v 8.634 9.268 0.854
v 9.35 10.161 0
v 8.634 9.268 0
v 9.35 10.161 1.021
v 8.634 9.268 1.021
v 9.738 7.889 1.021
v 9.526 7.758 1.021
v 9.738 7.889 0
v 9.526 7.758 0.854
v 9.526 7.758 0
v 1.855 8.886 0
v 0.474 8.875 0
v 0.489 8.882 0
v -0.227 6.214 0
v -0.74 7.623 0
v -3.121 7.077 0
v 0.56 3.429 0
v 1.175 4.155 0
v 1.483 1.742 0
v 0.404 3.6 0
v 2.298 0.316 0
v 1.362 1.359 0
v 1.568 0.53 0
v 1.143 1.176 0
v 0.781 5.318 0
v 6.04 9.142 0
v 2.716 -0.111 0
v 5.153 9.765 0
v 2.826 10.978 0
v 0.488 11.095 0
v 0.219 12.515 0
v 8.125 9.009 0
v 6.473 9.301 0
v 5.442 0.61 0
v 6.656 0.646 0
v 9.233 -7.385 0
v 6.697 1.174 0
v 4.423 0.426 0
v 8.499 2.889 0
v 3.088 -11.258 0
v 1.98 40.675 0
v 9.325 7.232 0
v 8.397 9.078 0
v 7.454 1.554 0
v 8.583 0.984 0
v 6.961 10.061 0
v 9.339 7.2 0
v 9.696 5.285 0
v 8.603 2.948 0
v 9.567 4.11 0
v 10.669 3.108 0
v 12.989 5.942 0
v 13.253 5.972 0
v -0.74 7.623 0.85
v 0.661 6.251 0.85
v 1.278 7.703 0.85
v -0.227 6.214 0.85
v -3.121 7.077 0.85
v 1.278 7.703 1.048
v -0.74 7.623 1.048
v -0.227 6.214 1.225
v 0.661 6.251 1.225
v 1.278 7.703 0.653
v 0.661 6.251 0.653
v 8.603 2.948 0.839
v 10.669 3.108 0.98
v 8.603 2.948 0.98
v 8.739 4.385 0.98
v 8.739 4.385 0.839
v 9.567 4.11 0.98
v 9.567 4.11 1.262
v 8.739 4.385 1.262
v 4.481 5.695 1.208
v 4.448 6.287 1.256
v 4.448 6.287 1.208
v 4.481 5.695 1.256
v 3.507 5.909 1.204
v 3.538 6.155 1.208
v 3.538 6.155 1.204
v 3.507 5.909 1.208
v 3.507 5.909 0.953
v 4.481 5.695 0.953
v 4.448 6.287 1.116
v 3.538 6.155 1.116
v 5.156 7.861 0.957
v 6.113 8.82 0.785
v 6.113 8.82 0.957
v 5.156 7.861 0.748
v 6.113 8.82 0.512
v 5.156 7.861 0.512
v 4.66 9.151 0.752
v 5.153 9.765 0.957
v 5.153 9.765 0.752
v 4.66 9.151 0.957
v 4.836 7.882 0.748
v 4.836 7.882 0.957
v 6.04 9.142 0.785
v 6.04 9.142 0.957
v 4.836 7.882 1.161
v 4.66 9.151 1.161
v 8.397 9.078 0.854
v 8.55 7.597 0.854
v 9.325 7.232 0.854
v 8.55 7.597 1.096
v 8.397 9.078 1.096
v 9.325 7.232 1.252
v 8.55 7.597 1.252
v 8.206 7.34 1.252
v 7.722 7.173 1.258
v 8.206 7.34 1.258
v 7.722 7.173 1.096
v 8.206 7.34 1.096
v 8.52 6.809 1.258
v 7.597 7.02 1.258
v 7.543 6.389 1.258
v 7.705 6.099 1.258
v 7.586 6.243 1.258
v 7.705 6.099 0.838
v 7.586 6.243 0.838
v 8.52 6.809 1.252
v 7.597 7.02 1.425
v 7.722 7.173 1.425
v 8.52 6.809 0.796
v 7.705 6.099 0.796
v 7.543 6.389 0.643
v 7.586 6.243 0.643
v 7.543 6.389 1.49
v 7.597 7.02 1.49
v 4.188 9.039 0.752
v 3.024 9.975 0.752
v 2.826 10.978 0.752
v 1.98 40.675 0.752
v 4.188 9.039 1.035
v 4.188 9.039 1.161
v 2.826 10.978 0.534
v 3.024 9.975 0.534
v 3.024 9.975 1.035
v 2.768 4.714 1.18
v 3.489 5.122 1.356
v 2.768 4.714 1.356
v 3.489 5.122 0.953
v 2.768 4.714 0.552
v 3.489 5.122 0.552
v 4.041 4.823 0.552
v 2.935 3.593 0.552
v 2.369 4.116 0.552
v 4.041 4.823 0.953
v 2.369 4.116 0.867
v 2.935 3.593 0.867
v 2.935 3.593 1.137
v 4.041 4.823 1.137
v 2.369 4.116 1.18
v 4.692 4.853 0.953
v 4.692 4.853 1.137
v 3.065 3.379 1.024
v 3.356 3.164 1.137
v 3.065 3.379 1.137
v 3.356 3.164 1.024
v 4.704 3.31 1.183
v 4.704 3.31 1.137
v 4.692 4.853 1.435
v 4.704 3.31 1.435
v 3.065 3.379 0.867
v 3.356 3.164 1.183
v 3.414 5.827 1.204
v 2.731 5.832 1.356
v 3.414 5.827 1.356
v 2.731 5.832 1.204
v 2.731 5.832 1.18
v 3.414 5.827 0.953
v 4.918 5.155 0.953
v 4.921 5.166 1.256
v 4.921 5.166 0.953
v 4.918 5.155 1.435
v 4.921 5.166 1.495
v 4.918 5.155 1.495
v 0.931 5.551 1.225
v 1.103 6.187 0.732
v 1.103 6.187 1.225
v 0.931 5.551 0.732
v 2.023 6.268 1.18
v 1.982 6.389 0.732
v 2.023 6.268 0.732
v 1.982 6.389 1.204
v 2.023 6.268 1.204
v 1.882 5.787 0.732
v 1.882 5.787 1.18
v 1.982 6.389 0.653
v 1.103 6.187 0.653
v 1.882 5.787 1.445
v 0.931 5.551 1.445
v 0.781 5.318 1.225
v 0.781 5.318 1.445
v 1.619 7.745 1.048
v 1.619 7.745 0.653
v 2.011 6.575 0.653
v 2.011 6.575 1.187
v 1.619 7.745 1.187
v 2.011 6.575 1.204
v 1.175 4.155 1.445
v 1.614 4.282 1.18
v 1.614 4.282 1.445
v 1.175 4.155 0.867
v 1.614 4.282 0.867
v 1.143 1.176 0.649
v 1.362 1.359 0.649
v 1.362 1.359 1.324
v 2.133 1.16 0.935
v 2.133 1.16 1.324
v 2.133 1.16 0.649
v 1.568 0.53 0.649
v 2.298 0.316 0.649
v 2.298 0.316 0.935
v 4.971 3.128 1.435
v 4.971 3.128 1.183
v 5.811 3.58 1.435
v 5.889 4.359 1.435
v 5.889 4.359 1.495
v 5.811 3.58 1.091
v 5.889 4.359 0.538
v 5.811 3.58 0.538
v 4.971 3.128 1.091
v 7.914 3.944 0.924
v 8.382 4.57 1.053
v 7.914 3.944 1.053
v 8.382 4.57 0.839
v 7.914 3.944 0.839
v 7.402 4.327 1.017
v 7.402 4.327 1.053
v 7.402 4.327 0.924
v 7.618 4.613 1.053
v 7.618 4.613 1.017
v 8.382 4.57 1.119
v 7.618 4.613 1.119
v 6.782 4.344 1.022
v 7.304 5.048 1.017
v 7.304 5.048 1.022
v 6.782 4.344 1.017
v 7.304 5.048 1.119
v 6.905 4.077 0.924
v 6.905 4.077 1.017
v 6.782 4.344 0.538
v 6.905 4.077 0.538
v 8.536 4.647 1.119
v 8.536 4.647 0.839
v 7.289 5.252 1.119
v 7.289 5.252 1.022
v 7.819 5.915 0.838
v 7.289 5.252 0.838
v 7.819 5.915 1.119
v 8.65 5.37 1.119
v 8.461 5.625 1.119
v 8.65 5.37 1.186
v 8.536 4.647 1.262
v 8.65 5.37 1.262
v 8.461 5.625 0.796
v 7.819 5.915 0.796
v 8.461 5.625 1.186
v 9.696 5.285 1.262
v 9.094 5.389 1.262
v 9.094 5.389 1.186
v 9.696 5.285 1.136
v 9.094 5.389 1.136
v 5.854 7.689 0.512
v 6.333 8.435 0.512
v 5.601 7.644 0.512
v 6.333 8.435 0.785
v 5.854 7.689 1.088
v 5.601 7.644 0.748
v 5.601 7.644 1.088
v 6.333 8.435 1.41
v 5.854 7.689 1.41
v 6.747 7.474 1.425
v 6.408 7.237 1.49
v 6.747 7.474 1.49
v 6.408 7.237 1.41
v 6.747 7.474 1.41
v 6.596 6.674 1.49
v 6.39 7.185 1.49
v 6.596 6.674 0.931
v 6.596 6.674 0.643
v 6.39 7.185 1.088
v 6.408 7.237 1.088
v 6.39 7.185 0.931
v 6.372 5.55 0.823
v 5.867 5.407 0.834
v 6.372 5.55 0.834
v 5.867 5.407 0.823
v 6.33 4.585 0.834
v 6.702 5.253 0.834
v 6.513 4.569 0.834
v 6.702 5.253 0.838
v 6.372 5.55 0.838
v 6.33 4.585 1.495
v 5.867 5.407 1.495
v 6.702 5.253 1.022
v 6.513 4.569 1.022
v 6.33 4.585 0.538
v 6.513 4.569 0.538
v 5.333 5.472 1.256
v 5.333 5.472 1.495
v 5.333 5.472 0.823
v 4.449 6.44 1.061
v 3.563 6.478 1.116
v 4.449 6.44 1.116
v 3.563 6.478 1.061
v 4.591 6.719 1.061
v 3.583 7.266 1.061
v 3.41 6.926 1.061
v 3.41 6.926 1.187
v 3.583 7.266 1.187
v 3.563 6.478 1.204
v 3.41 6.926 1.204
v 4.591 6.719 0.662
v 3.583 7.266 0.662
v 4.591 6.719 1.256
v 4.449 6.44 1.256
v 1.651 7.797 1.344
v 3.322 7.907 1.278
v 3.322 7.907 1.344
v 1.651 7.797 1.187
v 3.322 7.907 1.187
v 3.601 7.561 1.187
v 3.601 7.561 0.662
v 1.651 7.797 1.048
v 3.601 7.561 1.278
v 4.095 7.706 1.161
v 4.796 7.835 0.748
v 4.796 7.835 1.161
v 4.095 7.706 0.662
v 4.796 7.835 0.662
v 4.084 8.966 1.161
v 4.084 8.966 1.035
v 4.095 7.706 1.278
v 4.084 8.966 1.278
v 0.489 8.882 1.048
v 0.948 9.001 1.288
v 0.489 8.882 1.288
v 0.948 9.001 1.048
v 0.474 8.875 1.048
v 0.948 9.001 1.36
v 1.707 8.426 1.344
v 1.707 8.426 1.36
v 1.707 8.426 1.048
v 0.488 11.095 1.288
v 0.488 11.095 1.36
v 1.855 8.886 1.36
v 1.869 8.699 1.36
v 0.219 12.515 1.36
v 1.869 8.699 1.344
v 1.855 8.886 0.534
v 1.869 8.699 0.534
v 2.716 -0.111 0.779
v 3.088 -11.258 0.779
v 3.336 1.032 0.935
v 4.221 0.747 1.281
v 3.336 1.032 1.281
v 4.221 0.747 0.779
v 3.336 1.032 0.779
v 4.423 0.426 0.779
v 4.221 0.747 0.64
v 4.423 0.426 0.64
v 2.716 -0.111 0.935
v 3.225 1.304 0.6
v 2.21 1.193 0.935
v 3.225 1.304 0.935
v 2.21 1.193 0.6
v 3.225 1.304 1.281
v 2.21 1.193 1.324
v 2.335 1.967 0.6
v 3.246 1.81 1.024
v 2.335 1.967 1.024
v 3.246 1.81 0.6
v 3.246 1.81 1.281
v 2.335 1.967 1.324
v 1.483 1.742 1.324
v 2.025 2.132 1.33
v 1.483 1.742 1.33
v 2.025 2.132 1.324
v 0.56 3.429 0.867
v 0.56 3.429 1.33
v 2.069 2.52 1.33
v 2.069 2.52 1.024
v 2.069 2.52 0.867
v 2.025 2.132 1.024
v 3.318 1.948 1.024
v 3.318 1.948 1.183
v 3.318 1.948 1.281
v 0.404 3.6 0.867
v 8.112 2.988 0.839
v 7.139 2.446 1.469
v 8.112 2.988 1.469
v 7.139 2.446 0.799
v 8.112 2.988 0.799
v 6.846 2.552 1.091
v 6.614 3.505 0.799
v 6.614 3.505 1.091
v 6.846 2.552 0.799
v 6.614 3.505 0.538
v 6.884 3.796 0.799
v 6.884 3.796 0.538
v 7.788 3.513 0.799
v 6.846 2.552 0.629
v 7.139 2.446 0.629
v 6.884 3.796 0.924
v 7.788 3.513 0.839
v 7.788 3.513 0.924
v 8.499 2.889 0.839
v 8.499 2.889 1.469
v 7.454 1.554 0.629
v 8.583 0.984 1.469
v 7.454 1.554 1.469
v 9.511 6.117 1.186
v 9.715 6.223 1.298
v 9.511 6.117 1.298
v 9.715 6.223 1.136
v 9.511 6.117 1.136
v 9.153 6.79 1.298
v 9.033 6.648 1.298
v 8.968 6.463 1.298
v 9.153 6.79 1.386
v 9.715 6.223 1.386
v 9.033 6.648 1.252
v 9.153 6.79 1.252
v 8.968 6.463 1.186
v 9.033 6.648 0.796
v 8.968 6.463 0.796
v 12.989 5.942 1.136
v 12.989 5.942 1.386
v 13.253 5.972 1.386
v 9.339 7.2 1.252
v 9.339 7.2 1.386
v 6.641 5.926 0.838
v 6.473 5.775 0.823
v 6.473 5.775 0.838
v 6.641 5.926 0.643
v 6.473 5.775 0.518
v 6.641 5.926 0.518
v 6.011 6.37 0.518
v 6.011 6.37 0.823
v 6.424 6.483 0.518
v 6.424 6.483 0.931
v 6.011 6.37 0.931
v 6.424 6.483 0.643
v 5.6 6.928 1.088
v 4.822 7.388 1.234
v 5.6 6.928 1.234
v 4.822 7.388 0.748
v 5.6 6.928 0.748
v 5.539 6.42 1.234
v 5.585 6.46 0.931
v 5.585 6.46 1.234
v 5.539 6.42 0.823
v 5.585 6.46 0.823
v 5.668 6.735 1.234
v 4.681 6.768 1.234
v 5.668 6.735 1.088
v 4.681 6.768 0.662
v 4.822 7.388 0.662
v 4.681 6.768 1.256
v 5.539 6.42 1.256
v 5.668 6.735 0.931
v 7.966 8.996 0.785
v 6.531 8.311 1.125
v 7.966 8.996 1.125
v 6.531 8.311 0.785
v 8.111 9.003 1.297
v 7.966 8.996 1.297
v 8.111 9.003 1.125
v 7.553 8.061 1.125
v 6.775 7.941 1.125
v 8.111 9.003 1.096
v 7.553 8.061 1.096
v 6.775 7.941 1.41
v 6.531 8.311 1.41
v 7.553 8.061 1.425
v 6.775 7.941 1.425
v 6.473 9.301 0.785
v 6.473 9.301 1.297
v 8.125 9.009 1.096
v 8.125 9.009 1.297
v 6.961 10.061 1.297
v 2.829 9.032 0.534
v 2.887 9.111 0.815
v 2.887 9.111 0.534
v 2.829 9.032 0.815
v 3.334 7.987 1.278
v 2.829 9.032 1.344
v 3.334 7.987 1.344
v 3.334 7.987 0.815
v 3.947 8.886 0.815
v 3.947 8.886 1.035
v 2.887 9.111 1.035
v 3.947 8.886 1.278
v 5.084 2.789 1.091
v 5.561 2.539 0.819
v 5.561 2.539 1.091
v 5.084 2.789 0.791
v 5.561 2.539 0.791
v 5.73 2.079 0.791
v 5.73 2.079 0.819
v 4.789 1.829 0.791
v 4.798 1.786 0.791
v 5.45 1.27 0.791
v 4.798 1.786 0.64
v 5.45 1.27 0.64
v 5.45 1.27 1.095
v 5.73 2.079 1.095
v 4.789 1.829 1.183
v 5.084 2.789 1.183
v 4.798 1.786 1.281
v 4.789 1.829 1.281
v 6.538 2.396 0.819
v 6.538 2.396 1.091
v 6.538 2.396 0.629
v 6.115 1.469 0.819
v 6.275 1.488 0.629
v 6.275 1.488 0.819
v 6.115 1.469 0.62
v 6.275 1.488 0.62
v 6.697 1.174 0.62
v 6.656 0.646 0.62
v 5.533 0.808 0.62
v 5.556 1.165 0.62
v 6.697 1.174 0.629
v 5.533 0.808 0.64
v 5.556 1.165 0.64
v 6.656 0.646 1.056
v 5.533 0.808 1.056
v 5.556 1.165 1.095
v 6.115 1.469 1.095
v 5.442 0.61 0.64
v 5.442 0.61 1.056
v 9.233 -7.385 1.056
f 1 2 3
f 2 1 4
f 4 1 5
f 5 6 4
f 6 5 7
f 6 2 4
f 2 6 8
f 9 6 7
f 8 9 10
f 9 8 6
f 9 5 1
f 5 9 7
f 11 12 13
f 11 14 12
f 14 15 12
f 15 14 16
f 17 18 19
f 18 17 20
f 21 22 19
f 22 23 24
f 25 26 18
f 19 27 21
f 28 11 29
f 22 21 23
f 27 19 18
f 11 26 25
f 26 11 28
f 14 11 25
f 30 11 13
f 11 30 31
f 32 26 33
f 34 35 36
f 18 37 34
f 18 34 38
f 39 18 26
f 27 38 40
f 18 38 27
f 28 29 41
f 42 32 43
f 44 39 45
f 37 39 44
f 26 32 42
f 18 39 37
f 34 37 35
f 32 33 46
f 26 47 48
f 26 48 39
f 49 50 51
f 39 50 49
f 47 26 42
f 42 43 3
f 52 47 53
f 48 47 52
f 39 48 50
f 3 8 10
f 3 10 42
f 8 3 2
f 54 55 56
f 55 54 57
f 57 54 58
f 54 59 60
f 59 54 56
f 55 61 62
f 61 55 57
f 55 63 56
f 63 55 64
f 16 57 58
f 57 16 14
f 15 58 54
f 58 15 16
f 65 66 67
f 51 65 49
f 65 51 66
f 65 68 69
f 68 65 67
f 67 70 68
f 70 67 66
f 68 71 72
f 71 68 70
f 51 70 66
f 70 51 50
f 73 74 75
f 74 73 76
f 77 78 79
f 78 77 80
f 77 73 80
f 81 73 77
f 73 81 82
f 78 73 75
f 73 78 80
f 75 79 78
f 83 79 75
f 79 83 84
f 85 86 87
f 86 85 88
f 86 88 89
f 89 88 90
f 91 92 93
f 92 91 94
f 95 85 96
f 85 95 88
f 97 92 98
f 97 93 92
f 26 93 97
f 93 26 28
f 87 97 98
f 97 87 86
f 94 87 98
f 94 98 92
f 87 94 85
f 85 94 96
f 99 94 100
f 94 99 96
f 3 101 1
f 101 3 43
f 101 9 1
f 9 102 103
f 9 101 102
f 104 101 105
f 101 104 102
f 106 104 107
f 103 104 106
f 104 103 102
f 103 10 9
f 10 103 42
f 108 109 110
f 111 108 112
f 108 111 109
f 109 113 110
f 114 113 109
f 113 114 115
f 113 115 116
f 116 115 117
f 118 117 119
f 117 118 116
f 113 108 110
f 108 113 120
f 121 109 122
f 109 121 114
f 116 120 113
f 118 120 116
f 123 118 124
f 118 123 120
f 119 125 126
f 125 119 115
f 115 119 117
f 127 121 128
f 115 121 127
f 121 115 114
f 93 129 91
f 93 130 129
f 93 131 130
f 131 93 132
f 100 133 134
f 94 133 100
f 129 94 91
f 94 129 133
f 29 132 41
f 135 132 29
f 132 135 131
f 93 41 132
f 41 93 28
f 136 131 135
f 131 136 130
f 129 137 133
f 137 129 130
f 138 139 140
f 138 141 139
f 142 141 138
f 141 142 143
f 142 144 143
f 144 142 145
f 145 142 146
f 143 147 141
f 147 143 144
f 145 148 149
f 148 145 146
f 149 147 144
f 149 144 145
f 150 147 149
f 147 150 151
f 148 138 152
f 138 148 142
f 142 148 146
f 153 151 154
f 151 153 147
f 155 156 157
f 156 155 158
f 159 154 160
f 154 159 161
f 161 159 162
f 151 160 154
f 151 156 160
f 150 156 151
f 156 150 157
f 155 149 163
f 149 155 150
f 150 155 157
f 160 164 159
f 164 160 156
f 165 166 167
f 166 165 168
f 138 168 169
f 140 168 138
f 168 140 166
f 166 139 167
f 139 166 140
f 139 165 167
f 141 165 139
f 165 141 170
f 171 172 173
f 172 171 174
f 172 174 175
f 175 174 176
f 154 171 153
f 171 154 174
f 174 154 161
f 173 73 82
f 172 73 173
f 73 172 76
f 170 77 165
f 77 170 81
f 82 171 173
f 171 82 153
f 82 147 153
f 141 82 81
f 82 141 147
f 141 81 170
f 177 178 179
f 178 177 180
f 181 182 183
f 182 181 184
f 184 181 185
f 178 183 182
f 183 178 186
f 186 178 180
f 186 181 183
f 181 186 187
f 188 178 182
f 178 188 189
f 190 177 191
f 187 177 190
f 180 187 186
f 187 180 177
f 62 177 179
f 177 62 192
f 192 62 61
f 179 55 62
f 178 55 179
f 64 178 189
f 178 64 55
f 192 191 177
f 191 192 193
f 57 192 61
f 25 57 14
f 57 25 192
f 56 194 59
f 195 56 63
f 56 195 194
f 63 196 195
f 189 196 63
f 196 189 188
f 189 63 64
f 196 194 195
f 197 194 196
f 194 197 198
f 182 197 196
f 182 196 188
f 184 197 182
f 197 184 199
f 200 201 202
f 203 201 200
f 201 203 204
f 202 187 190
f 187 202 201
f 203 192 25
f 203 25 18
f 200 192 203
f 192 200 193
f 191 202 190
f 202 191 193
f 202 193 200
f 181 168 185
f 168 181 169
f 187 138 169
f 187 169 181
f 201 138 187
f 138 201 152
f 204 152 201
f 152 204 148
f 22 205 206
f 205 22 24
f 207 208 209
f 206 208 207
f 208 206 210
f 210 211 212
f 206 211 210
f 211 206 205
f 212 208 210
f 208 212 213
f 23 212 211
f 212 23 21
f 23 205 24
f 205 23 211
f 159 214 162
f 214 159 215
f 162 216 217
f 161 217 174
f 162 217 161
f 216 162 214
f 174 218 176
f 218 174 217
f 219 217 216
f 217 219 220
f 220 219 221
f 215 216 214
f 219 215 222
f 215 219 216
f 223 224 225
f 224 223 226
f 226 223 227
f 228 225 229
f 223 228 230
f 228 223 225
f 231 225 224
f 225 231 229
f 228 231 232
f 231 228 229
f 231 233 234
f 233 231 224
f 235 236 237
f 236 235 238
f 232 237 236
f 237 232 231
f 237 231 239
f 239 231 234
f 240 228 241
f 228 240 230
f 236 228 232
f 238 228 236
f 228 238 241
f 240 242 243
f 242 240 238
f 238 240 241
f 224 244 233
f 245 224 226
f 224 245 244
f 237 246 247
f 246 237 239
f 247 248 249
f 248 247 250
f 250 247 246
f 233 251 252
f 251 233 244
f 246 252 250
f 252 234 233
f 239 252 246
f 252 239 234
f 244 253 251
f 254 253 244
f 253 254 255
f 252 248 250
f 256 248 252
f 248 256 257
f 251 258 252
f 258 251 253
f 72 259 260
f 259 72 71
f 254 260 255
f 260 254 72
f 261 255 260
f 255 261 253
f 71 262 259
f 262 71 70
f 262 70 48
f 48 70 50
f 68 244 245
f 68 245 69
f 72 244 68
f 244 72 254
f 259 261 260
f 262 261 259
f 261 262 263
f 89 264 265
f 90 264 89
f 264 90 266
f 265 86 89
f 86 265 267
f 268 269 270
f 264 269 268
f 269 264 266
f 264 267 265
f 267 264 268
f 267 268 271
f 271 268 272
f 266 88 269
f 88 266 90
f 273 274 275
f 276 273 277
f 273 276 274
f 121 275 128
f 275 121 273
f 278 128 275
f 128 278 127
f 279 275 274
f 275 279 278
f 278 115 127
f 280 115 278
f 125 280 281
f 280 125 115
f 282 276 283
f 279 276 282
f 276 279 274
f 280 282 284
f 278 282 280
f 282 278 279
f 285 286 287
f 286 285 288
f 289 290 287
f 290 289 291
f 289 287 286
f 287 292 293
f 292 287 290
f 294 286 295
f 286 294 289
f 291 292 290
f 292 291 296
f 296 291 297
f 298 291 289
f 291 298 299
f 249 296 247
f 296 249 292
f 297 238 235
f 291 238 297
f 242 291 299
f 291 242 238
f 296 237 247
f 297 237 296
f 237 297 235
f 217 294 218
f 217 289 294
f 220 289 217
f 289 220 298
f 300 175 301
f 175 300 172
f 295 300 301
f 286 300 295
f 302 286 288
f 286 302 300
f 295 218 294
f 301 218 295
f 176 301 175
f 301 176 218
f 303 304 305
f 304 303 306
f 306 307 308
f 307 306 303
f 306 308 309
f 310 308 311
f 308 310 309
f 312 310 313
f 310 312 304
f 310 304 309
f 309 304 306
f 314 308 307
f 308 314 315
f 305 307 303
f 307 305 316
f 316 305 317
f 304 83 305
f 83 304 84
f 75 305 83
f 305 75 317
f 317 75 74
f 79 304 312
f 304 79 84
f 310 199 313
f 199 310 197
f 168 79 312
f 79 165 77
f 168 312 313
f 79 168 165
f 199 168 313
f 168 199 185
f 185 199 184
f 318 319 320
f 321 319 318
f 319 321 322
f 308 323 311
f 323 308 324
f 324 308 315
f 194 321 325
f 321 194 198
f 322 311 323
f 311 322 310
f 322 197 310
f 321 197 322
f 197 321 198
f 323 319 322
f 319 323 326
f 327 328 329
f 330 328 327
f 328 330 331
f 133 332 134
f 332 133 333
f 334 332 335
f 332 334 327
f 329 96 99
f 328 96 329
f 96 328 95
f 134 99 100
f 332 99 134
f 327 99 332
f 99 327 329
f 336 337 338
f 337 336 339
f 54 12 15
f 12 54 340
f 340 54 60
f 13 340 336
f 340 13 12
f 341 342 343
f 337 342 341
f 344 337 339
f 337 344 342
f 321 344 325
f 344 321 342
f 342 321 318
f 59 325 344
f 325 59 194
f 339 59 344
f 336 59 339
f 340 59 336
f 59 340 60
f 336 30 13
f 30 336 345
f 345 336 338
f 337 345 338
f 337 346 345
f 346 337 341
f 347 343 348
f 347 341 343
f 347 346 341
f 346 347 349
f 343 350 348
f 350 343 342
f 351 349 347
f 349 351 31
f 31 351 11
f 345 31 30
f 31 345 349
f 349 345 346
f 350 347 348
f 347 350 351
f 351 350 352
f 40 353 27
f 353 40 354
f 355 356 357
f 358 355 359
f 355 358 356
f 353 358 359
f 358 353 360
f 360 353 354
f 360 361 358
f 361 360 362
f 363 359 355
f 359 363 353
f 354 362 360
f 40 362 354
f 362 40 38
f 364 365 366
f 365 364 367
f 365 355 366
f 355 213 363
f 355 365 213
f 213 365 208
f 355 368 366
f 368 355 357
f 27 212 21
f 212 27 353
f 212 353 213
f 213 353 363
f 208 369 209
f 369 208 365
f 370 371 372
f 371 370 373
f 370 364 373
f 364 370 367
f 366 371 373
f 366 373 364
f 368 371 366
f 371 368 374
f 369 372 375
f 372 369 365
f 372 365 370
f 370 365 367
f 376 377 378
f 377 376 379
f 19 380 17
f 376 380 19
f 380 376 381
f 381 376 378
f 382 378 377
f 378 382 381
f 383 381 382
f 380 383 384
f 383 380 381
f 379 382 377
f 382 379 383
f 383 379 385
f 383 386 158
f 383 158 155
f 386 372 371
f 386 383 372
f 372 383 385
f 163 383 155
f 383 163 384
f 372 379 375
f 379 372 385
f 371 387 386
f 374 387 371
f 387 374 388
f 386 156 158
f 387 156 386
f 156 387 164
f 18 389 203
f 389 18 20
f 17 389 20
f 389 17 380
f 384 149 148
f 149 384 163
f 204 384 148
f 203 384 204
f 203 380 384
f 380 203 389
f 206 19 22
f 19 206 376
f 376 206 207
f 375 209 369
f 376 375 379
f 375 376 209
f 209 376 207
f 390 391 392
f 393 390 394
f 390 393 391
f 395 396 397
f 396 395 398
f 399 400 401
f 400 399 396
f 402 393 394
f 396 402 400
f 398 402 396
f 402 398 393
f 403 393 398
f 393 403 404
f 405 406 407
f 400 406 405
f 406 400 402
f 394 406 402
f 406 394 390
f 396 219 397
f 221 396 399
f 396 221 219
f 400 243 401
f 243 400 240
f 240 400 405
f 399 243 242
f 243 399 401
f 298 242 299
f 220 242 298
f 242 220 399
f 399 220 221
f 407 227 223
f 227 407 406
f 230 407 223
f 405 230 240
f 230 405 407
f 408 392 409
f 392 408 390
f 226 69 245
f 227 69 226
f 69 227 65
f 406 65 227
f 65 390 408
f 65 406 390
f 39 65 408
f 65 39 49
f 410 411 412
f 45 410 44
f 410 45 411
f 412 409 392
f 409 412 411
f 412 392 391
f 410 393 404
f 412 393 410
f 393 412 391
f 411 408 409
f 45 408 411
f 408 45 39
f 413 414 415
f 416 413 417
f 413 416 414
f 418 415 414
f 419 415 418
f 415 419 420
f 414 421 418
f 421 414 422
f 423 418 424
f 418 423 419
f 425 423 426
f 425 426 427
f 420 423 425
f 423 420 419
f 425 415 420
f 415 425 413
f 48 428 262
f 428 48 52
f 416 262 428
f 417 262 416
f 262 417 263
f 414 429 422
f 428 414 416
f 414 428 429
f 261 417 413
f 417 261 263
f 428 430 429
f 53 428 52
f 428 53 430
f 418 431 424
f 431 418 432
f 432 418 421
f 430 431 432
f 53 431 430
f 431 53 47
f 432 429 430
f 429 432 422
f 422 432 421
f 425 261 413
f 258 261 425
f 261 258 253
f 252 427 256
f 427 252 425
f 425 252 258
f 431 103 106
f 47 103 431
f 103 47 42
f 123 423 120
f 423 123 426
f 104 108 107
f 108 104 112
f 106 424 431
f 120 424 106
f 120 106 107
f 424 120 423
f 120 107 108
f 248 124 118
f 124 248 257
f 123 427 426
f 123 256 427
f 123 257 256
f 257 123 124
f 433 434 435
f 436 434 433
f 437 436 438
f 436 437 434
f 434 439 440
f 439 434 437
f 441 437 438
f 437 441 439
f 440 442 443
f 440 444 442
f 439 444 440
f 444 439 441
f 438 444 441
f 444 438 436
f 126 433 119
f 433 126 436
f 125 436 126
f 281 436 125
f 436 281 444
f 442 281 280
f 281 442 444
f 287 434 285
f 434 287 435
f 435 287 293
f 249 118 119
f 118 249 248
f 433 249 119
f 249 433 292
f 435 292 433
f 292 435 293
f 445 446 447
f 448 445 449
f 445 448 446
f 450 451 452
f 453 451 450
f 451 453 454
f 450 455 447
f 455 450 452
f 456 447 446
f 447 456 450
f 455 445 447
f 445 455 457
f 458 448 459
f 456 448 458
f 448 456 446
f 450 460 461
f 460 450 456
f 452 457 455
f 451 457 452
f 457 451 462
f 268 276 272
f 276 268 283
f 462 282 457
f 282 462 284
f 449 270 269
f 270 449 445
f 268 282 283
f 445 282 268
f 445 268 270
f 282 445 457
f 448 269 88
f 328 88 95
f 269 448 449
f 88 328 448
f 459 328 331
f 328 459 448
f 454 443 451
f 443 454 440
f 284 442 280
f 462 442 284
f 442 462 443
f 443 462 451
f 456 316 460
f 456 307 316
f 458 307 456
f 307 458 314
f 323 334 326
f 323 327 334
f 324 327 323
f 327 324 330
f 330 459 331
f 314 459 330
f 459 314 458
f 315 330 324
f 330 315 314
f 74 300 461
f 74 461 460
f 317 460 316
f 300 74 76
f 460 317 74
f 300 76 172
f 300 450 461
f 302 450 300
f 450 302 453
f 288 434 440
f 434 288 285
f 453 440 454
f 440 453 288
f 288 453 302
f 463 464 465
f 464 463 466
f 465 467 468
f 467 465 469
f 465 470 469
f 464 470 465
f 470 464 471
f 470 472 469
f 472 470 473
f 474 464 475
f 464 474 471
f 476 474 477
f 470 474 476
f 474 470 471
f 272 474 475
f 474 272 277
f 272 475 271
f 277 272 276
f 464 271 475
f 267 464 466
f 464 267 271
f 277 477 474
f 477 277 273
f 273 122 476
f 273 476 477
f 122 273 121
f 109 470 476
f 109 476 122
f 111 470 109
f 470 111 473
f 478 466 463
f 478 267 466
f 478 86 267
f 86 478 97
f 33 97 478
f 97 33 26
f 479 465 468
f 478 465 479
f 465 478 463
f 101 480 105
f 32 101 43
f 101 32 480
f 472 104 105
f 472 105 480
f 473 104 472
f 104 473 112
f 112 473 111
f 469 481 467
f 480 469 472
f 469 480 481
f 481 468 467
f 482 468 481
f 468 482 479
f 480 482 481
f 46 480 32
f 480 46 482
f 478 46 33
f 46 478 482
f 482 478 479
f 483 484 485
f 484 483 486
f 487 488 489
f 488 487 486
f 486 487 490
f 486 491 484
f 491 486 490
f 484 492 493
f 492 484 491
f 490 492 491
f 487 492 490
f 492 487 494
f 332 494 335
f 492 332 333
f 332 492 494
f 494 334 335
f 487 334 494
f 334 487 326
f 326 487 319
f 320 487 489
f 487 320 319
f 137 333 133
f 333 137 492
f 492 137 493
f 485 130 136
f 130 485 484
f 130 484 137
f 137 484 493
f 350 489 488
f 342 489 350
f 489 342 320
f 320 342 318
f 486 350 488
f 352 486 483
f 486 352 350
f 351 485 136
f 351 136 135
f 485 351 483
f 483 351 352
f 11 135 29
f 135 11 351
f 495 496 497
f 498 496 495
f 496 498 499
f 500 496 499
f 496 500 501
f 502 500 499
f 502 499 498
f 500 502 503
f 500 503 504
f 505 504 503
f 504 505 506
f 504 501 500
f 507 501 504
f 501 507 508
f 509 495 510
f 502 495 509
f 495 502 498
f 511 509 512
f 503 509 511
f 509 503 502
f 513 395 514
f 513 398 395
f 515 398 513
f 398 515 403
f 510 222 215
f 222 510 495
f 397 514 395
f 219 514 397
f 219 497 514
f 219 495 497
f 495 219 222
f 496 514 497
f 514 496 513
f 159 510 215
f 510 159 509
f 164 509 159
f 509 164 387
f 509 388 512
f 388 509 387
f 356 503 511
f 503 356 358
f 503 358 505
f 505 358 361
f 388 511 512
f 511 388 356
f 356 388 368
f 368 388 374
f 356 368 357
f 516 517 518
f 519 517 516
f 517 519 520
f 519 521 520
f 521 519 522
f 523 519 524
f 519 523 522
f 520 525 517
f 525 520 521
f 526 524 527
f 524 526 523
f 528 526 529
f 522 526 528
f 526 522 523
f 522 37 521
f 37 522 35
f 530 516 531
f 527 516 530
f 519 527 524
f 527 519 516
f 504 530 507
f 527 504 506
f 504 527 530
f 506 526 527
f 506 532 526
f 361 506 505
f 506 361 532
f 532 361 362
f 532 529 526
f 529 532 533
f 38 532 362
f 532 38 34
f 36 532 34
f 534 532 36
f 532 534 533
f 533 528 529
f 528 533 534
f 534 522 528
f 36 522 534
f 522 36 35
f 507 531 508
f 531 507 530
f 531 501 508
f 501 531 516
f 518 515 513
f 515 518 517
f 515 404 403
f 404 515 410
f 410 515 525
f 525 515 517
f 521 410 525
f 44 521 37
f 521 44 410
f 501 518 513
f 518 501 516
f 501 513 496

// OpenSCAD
union() {
	linear_extrude(height = 1.0207922870) {
		polygon(paths = [[0, 1, 2, 3]], points = [[9.52566656256, 7.75836617469], [8.63392170772, 9.26786135332], [9.35002865057, 10.1605692325], [9.73784765292, 7.88861155978]]);
	}
	linear_extrude(height = 0.8497586225) {
		polygon(paths = [[0, 1, 2, 3, 4]], points = [[1.27799073559, 7.70348204245], [0.661408463257, 6.25144660433], [-0.226826437742, 6.21355144658], [-3.12149477588, 7.0767058796], [-0.739716736418, 7.62337323549]]);
	}
	linear_extrude(height = 0.9801351133) {
		polygon(paths = [[0, 1, 2, 3]], points = [[8.73892172541, 4.38512109028], [9.5674535006, 4.10991169649], [10.6688512756, 3.10831665664], [8.60269110292, 2.94796179979]]);
	}
	linear_extrude(height = 1.2083709732) {
		polygon(paths = [[0, 1, 2, 3]], points = [[3.53832100087, 6.15539449564], [4.44846604423, 6.28672187119], [4.48127992633, 5.6946344687], [3.50712951526, 5.90906334299]]);
	}
	linear_extrude(height = 0.9573823767) {
		polygon(paths = [[0, 1, 2, 3, 4, 5]], points = [[6.11284510928, 8.81979017659], [6.0397108407, 9.14182763606], [5.15340882167, 9.76510572152], [4.66045454331, 9.15068245735], [4.83611394999, 7.88154454414], [5.15613683869, 7.86124328209]]);
	}
	linear_extrude(height = 0.8544519060) {
		polygon(paths = [[0, 1, 2, 3, 4]], points = [[9.3250596394, 7.23165176768], [9.52566656256, 7.75836617469], [8.63392170772, 9.26786135332], [8.3966686199, 9.07778569864], [8.55047109513, 7.59704590106]]);
	}
	linear_extrude(height = 1.2580519610) {
		polygon(paths = [[0, 1, 2, 3, 4, 5, 6]], points = [[7.58597784175, 6.24304880706], [7.54262375542, 6.38888645463], [7.5974129095, 7.01984199858], [7.72203919516, 7.17336323244], [8.20596704088, 7.33985616165], [8.51985390331, 6.80928840613], [7.70525980416, 6.09871126163]]);
	}
	linear_extrude(height = 0.7522731902) {
		polygon(paths = [[0, 1, 2, 3, 4, 5]], points = [[4.18844691984, 9.03859152], [4.66045454331, 9.15068245735], [5.15340882167, 9.76510572152], [1.97962206675, 40.6749598419], [2.82552954604, 10.9781721163], [3.02394524632, 9.97536280468]]);
	}
	linear_extrude(height = 0.5522795534) {
		polygon(paths = [[0, 1, 2, 3, 4]], points = [[4.04123916644, 4.82265946782], [2.93510144866, 3.59261703475], [2.36936049365, 4.11573184318], [2.76796677381, 4.71373396677], [3.48858280028, 5.12167315215]]);
	}
	linear_extrude(height = 1.1374388929) {
		polygon(paths = [[0, 1, 2, 3, 4, 5]], points = [[4.04123916644, 4.82265946782], [4.69244746141, 4.85278409801], [4.70351558892, 3.30980985899], [3.3563735058, 3.16428860819], [3.06509011333, 3.37886682872], [2.93510144866, 3.59261703475]]);
	}
	linear_extrude(height = 1.3559055023) {
		polygon(paths = [[0, 1, 2, 3]], points = [[3.48858280028, 5.12167315215], [3.41424595672, 5.826690721], [2.73068445473, 5.83239785703], [2.76796677381, 4.71373396677]]);
	}
	linear_extrude(height = 0.9528584085) {
		polygon(paths = [[0, 1, 2, 3, 4, 5, 6, 7]], points = [[4.04123916644, 4.82265946782], [4.69244746141, 4.85278409801], [4.91755376756, 5.1545550275], [4.92111601951, 5.16639881272], [4.48127992633, 5.6946344687], [3.50712951526, 5.90906334299], [3.41424595672, 5.826690721], [3.48858280028, 5.12167315215]]);
	}
	linear_extrude(height = 0.7315363178) {
		polygon(paths = [[0, 1, 2, 3, 4]], points = [[1.88153125016, 5.78700187361], [0.930702142117, 5.55105298225], [1.10299619594, 6.18748822931], [1.98229237417, 6.38945899755], [2.02265560746, 6.26847966471]]);
	}
	linear_extrude(height = 1.2249668668) {
		polygon(paths = [[0, 1, 2, 3, 4]], points = [[0.930702142117, 5.55105298225], [0.780654764482, 5.31809381197], [-0.226826437742, 6.21355144658], [0.661408463257, 6.25144660433], [1.10299619594, 6.18748822931]]);
	}
	linear_extrude(height = 0.6527106851) {
		polygon(paths = [[0, 1, 2, 3, 4, 5]], points = [[1.98229237417, 6.38945899755], [2.01121521685, 6.57463932967], [1.61899356431, 7.74538067286], [1.27799073559, 7.70348204245], [0.661408463257, 6.25144660433], [1.10299619594, 6.18748822931]]);
	}
	linear_extrude(height = 1.4453527562) {
		polygon(paths = [[0, 1, 2, 3, 4]], points = [[1.88153125016, 5.78700187361], [1.61440509874, 4.28228572455], [1.17502969525, 4.15476345653], [0.780654764482, 5.31809381197], [0.930702142117, 5.55105298225]]);
	}
	linear_extrude(height = 1.1802515304) {
		polygon(paths = [[0, 1, 2, 3, 4, 5]], points = [[1.88153125016, 5.78700187361], [1.61440509874, 4.28228572455], [2.36936049365, 4.11573184318], [2.76796677381, 4.71373396677], [2.73068445473, 5.83239785703], [2.02265560746, 6.26847966471]]);
	}
	linear_extrude(height = 0.6488736969) {
		polygon(paths = [[0, 1, 2, 3, 4]], points = [[1.36242036164, 1.3594317419], [1.14280830335, 1.17582469596], [1.56826054723, 0.530047623123], [2.29843176366, 0.316159234238], [2.13256252282, 1.15996950513]]);
	}
	linear_extrude(height = 1.4350478301) {
		polygon(paths = [[0, 1, 2, 3, 4, 5]], points = [[5.81148807237, 3.58000651584], [5.88860488395, 4.35931171311], [4.91755376756, 5.1545550275], [4.69244746141, 4.85278409801], [4.70351558892, 3.30980985899], [4.97075097424, 3.12796967344]]);
	}
	linear_extrude(height = 1.0528887361) {
		polygon(paths = [[0, 1, 2, 3]], points = [[7.401858997, 4.32654180336], [7.91428217002, 3.94381461918], [8.38211772214, 4.57027723182], [7.61762758241, 4.61288197636]]);
	}
	linear_extrude(height = 1.0169959326) {
		polygon(paths = [[0, 1, 2, 3, 4]], points = [[7.401858997, 4.32654180336], [6.90469286349, 4.07746142729], [6.78210369509, 4.34442336312], [7.30402620225, 5.04798863753], [7.61762758241, 4.61288197636]]);
	}
	linear_extrude(height = 1.1187382762) {
		polygon(paths = [[0, 1, 2, 3, 4, 5, 6, 7]], points = [[8.6502901473, 5.36997964674], [8.53636489392, 4.6465476257], [8.38211772214, 4.57027723182], [7.61762758241, 4.61288197636], [7.30402620225, 5.04798863753], [7.28944946655, 5.25221350019], [7.81856302666, 5.91532771795], [8.46095940085, 5.62525986477]]);
	}
	linear_extrude(height = 1.2619736662) {
		polygon(paths = [[0, 1, 2, 3, 4, 5]], points = [[9.09427099783, 5.38905777744], [9.69627135654, 5.28453338929], [9.5674535006, 4.10991169649], [8.73892172541, 4.38512109028], [8.53636489392, 4.6465476257], [8.6502901473, 5.36997964674]]);
	}
	linear_extrude(height = 0.5120851423) {
		polygon(paths = [[0, 1, 2, 3, 4]], points = [[5.85430090212, 7.68913648446], [5.60053403571, 7.64378334398], [5.15613683869, 7.86124328209], [6.11284510928, 8.81979017659], [6.33310437043, 8.43469055727]]);
	}
	linear_extrude(height = 1.4904701845) {
		polygon(paths = [[0, 1, 2, 3, 4, 5]], points = [[6.40752377485, 7.23682247747], [6.39045348135, 7.18538995762], [6.5963944614, 6.67420917052], [7.54262375542, 6.38888645463], [7.5974129095, 7.01984199858], [6.74745606179, 7.47424743223]]);
	}
	linear_extrude(height = 0.8335463253) {
		polygon(paths = [[0, 1, 2, 3, 4]], points = [[6.37210964585, 5.54968017681], [6.70154621387, 5.25259630943], [6.51291136438, 4.56887034235], [6.3302893702, 4.58533243561], [5.86658928633, 5.40707234429]]);
	}
	linear_extrude(height = 1.0215100067) {
		polygon(paths = [[0, 1, 2, 3, 4]], points = [[6.51291136438, 4.56887034235], [6.78210369509, 4.34442336312], [7.30402620225, 5.04798863753], [7.28944946655, 5.25221350019], [6.70154621387, 5.25259630943]]);
	}
	linear_extrude(height = 1.4948932300) {
		polygon(paths = [[0, 1, 2, 3, 4, 5]], points = [[5.86658928633, 5.40707234429], [5.33345853501, 5.47189698303], [4.92111601951, 5.16639881272], [4.91755376756, 5.1545550275], [5.88860488395, 4.35931171311], [6.3302893702, 4.58533243561]]);
	}
	linear_extrude(height = 1.0607822114) {
		polygon(paths = [[0, 1, 2, 3, 4]], points = [[3.58345989907, 7.265507009], [4.59137000321, 6.7188913897], [4.44930394407, 6.44030821278], [3.56275417383, 6.47753316045], [3.40977057612, 6.92602386411]]);
	}
	linear_extrude(height = 1.1164222890) {
		polygon(paths = [[0, 1, 2, 3]], points = [[3.56275417383, 6.47753316045], [3.53832100087, 6.15539449564], [4.44846604423, 6.28672187119], [4.44930394407, 6.44030821278]]);
	}
	linear_extrude(height = 1.2039883302) {
		polygon(paths = [[0, 1, 2, 3, 4, 5, 6, 7, 8]], points = [[3.40977057612, 6.92602386411], [2.01121521685, 6.57463932967], [1.98229237417, 6.38945899755], [2.02265560746, 6.26847966471], [2.73068445473, 5.83239785703], [3.41424595672, 5.826690721], [3.50712951526, 5.90906334299], [3.53832100087, 6.15539449564], [3.56275417383, 6.47753316045]]);
	}
	linear_extrude(height = 1.1873093217) {
		polygon(paths = [[0, 1, 2, 3, 4, 5, 6]], points = [[3.32250038149, 7.90747585993], [1.6514545449, 7.79691273049], [1.61899356431, 7.74538067286], [2.01121521685, 6.57463932967], [3.40977057612, 6.92602386411], [3.58345989907, 7.265507009], [3.60056819053, 7.56071788375]]);
	}
	linear_extrude(height = 1.1610674682) {
		polygon(paths = [[0, 1, 2, 3, 4, 5]], points = [[4.08419020365, 8.96601370727], [4.18844691984, 9.03859152], [4.66045454331, 9.15068245735], [4.83611394999, 7.88154454414], [4.7962244097, 7.83496527832], [4.09543275098, 7.70581686206]]);
	}
	linear_extrude(height = 1.0480905672) {
		polygon(paths = [[0, 1, 2, 3, 4, 5, 6, 7]], points = [[0.489498550274, 8.88247776463], [0.948493829207, 9.00083548814], [1.70699052993, 8.42567897556], [1.6514545449, 7.79691273049], [1.61899356431, 7.74538067286], [1.27799073559, 7.70348204245], [-0.739716736418, 7.62337323549], [0.473793061694, 8.87532697821]]);
	}
	linear_extrude(height = 1.2884392493) {
		polygon(paths = [[0, 1, 2]], points = [[0.487976005115, 11.0952218853], [0.948493829207, 9.00083548814], [0.489498550274, 8.88247776463]]);
	}
	linear_extrude(height = 1.3603103519) {
		polygon(paths = [[0, 1, 2, 3, 4, 5]], points = [[0.487976005115, 11.0952218853], [0.948493829207, 9.00083548814], [1.70699052993, 8.42567897556], [1.86880336952, 8.69863518296], [1.85496958743, 8.88573562713], [0.21905207645, 12.5154973652]]);
	}
	linear_extrude(height = 0.7793000729) {
		polygon(paths = [[0, 1, 2, 3, 4]], points = [[3.33632034062, 1.03167003792], [2.71604737808, -0.111393257291], [3.08843282427, -11.2584990729], [4.42271562353, 0.426482235577], [4.22081317647, 0.747364888152]]);
	}
	linear_extrude(height = 0.9348078308) {
		polygon(paths = [[0, 1, 2, 3, 4, 5]], points = [[3.22506684795, 1.30410328144], [2.21007921717, 1.19264415803], [2.13256252282, 1.15996950513], [2.29843176366, 0.316159234238], [2.71604737808, -0.111393257291], [3.33632034062, 1.03167003792]]);
	}
	linear_extrude(height = 0.5997391781) {
		polygon(paths = [[0, 1, 2, 3]], points = [[3.24640428036, 1.8095531033], [2.33541063157, 1.9668032067], [2.21007921717, 1.19264415803], [3.22506684795, 1.30410328144]]);
	}
	linear_extrude(height = 1.3304485796) {
		polygon(paths = [[0, 1, 2, 3]], points = [[1.48316529415, 1.74247994448], [2.02480264226, 2.13182580393], [2.06890206566, 2.52001951793], [0.560124458294, 3.42887793624]]);
	}
	linear_extrude(height = 1.0244459977) {
		polygon(paths = [[0, 1, 2, 3, 4, 5, 6]], points = [[2.02480264226, 2.13182580393], [2.33541063157, 1.9668032067], [3.24640428036, 1.8095531033], [3.31834211258, 1.94840404205], [3.3563735058, 3.16428860819], [3.06509011333, 3.37886682872], [2.06890206566, 2.52001951793]]);
	}
	linear_extrude(height = 0.8670380580) {
		polygon(paths = [[0, 1, 2, 3, 4, 5, 6, 7]], points = [[0.560124458294, 3.42887793624], [0.403682594793, 3.6003766763], [1.17502969525, 4.15476345653], [1.61440509874, 4.28228572455], [2.36936049365, 4.11573184318], [2.93510144866, 3.59261703475], [3.06509011333, 3.37886682872], [2.06890206566, 2.52001951793]]);
	}
	linear_extrude(height = 1.3239320667) {
		polygon(paths = [[0, 1, 2, 3, 4, 5]], points = [[1.48316529415, 1.74247994448], [1.36242036164, 1.3594317419], [2.13256252282, 1.15996950513], [2.21007921717, 1.19264415803], [2.33541063157, 1.9668032067], [2.02480264226, 2.13182580393]]);
	}
	linear_extrude(height = 0.7992447332) {
		polygon(paths = [[0, 1, 2, 3, 4, 5]], points = [[6.8456916123, 2.55180092125], [6.61418229333, 3.50538172286], [6.88449609228, 3.7962333571], [7.78819358019, 3.51350256568], [8.11175542459, 2.98798816265], [7.13865111749, 2.44590031984]]);
	}
	linear_extrude(height = 0.5380529481) {
		polygon(paths = [[0, 1, 2, 3, 4, 5, 6, 7]], points = [[6.61418229333, 3.50538172286], [5.81148807237, 3.58000651584], [5.88860488395, 4.35931171311], [6.3302893702, 4.58533243561], [6.51291136438, 4.56887034235], [6.78210369509, 4.34442336312], [6.90469286349, 4.07746142729], [6.88449609228, 3.7962333571]]);
	}
	linear_extrude(height = 0.9235073121) {
		polygon(paths = [[0, 1, 2, 3, 4]], points = [[7.78819358019, 3.51350256568], [7.91428217002, 3.94381461918], [7.401858997, 4.32654180336], [6.90469286349, 4.07746142729], [6.88449609228, 3.7962333571]]);
	}
	linear_extrude(height = 0.8387008976) {
		polygon(paths = [[0, 1, 2, 3, 4, 5, 6, 7]], points = [[7.78819358019, 3.51350256568], [7.91428217002, 3.94381461918], [8.38211772214, 4.57027723182], [8.53636489392, 4.6465476257], [8.73892172541, 4.38512109028], [8.60269110292, 2.94796179979], [8.49866326795, 2.88940355272], [8.11175542459, 2.98798816265]]);
	}
	linear_extrude(height = 1.4685136580) {
		polygon(paths = [[0, 1, 2, 3, 4]], points = [[7.13865111749, 2.44590031984], [7.45392965694, 1.55385088361], [8.58309000982, 0.98441093929], [8.49866326795, 2.88940355272], [8.11175542459, 2.98798816265]]);
	}
	linear_extrude(height = 1.2976265271) {
		polygon(paths = [[0, 1, 2, 3, 4]], points = [[8.96806634873, 6.46310421164], [9.51091594058, 6.11709188761], [9.71453868469, 6.22350472008], [9.15288323814, 6.78983266003], [9.03325762095, 6.6480081444]]);
	}
	linear_extrude(height = 1.1360845372) {
		polygon(paths = [[0, 1, 2, 3, 4]], points = [[9.51091594058, 6.11709188761], [9.09427099783, 5.38905777744], [9.69627135654, 5.28453338929], [12.9890967182, 5.9418198422], [9.71453868469, 6.22350472008]]);
	}
	linear_extrude(height = 1.3858690260) {
		polygon(paths = [[0, 1, 2, 3, 4]], points = [[9.15288323814, 6.78983266003], [9.3391371351, 7.19971261738], [13.252868762, 5.97232811689], [12.9890967182, 5.9418198422], [9.71453868469, 6.22350472008]]);
	}
	linear_extrude(height = 1.1856045676) {
		polygon(paths = [[0, 1, 2, 3, 4]], points = [[8.96806634873, 6.46310421164], [8.46095940085, 5.62525986477], [8.6502901473, 5.36997964674], [9.09427099783, 5.38905777744], [9.51091594058, 6.11709188761]]);
	}
	linear_extrude(height = 1.2524688216) {
		polygon(paths = [[0, 1, 2, 3, 4, 5, 6]], points = [[9.03325762095, 6.6480081444], [8.51985390331, 6.80928840613], [8.20596704088, 7.33985616165], [8.55047109513, 7.59704590106], [9.3250596394, 7.23165176768], [9.3391371351, 7.19971261738], [9.15288323814, 6.78983266003]]);
	}
	linear_extrude(height = 0.7957579206) {
		polygon(paths = [[0, 1, 2, 3, 4, 5]], points = [[8.96806634873, 6.46310421164], [8.46095940085, 5.62525986477], [7.81856302666, 5.91532771795], [7.70525980416, 6.09871126163], [8.51985390331, 6.80928840613], [9.03325762095, 6.6480081444]]);
	}
	linear_extrude(height = 0.5184488965) {
		polygon(paths = [[0, 1, 2, 3]], points = [[6.47272270294, 5.77470352649], [6.0108228732, 6.37002971515], [6.4244531131, 6.48333007852], [6.64123608222, 5.92552532556]]);
	}
	linear_extrude(height = 0.6433525708) {
		polygon(paths = [[0, 1, 2, 3, 4]], points = [[6.64123608222, 5.92552532556], [7.58597784175, 6.24304880706], [7.54262375542, 6.38888645463], [6.5963944614, 6.67420917052], [6.4244531131, 6.48333007852]]);
	}
	linear_extrude(height = 0.8381533166) {
		polygon(paths = [[0, 1, 2, 3, 4, 5, 6, 7]], points = [[6.47272270294, 5.77470352649], [6.37210964585, 5.54968017681], [6.70154621387, 5.25259630943], [7.28944946655, 5.25221350019], [7.81856302666, 5.91532771795], [7.70525980416, 6.09871126163], [7.58597784175, 6.24304880706], [6.64123608222, 5.92552532556]]);
	}
	linear_extrude(height = 1.2335250916) {
		polygon(paths = [[0, 1, 2, 3, 4, 5]], points = [[5.58486845903, 6.45984062369], [5.66757602312, 6.73493261695], [5.60035925206, 6.92767889132], [4.82249402278, 7.38832278277], [4.68083191822, 6.76757100233], [5.5394077778, 6.41973057349]]);
	}
	linear_extrude(height = 1.0876893916) {
		polygon(paths = [[0, 1, 2, 3, 4, 5]], points = [[5.66757602312, 6.73493261695], [6.39045348135, 7.18538995762], [6.40752377485, 7.23682247747], [5.85430090212, 7.68913648446], [5.60053403571, 7.64378334398], [5.60035925206, 6.92767889132]]);
	}
	linear_extrude(height = 0.7480677522) {
		polygon(paths = [[0, 1, 2, 3, 4, 5]], points = [[4.82249402278, 7.38832278277], [4.7962244097, 7.83496527832], [4.83611394999, 7.88154454414], [5.15613683869, 7.86124328209], [5.60053403571, 7.64378334398], [5.60035925206, 6.92767889132]]);
	}
	linear_extrude(height = 0.9313342981) {
		polygon(paths = [[0, 1, 2, 3, 4, 5]], points = [[5.58486845903, 6.45984062369], [6.0108228732, 6.37002971515], [6.4244531131, 6.48333007852], [6.5963944614, 6.67420917052], [6.39045348135, 7.18538995762], [5.66757602312, 6.73493261695]]);
	}
	linear_extrude(height = 0.6615596344) {
		polygon(paths = [[0, 1, 2, 3, 4, 5, 6]], points = [[4.68083191822, 6.76757100233], [4.59137000321, 6.7188913897], [3.58345989907, 7.265507009], [3.60056819053, 7.56071788375], [4.09543275098, 7.70581686206], [4.7962244097, 7.83496527832], [4.82249402278, 7.38832278277]]);
	}
	linear_extrude(height = 1.2556520170) {
		polygon(paths = [[0, 1, 2, 3, 4, 5, 6, 7]], points = [[5.5394077778, 6.41973057349], [5.33345853501, 5.47189698303], [4.92111601951, 5.16639881272], [4.48127992633, 5.6946344687], [4.44846604423, 6.28672187119], [4.44930394407, 6.44030821278], [4.59137000321, 6.7188913897], [4.68083191822, 6.76757100233]]);
	}
	linear_extrude(height = 0.8227090470) {
		polygon(paths = [[0, 1, 2, 3, 4, 5, 6]], points = [[5.58486845903, 6.45984062369], [6.0108228732, 6.37002971515], [6.47272270294, 5.77470352649], [6.37210964585, 5.54968017681], [5.86658928633, 5.40707234429], [5.33345853501, 5.47189698303], [5.5394077778, 6.41973057349]]);
	}
	linear_extrude(height = 1.1247163338) {
		polygon(paths = [[0, 1, 2, 3, 4]], points = [[7.96579997528, 8.99623872061], [6.53094625907, 8.31125361725], [6.77533246927, 7.94128395993], [7.55303990309, 8.06072933941], [8.11139814807, 9.00252768212]]);
	}
	linear_extrude(height = 1.4097017764) {
		polygon(paths = [[0, 1, 2, 3, 4, 5]], points = [[6.53094625907, 8.31125361725], [6.33310437043, 8.43469055727], [5.85430090212, 7.68913648446], [6.40752377485, 7.23682247747], [6.74745606179, 7.47424743223], [6.77533246927, 7.94128395993]]);
	}
	linear_extrude(height = 1.4249445243) {
		polygon(paths = [[0, 1, 2, 3, 4]], points = [[7.55303990309, 8.06072933941], [7.72203919516, 7.17336323244], [7.5974129095, 7.01984199858], [6.74745606179, 7.47424743223], [6.77533246927, 7.94128395993]]);
	}
	linear_extrude(height = 0.7846647966) {
		polygon(paths = [[0, 1, 2, 3, 4, 5]], points = [[7.96579997528, 8.99623872061], [6.47295397901, 9.30065113946], [6.0397108407, 9.14182763606], [6.11284510928, 8.81979017659], [6.33310437043, 8.43469055727], [6.53094625907, 8.31125361725]]);
	}
	linear_extrude(height = 1.0962467242) {
		polygon(paths = [[0, 1, 2, 3, 4, 5, 6]], points = [[8.11139814807, 9.00252768212], [8.12489331405, 9.00927336637], [8.3966686199, 9.07778569864], [8.55047109513, 7.59704590106], [8.20596704088, 7.33985616165], [7.72203919516, 7.17336323244], [7.55303990309, 8.06072933941]]);
	}
	linear_extrude(height = 1.2972807531) {
		polygon(paths = [[0, 1, 2, 3, 4]], points = [[7.96579997528, 8.99623872061], [6.47295397901, 9.30065113946], [6.96094016199, 10.0612286531], [8.12489331405, 9.00927336637], [8.11139814807, 9.00252768212]]);
	}
	linear_extrude(height = 0.8146133108) {
		polygon(paths = [[0, 1, 2, 3]], points = [[2.82858341062, 9.03230364969], [3.33419508839, 7.9870864713], [3.94732224704, 8.88649966438], [2.88708491333, 9.11062272511]]);
	}
	linear_extrude(height = 1.2780835873) {
		polygon(paths = [[0, 1, 2, 3, 4, 5]], points = [[3.33419508839, 7.9870864713], [3.32250038149, 7.90747585993], [3.60056819053, 7.56071788375], [4.09543275098, 7.70581686206], [4.08419020365, 8.96601370727], [3.94732224704, 8.88649966438]]);
	}
	linear_extrude(height = 1.0345309558) {
		polygon(paths = [[0, 1, 2, 3, 4]], points = [[2.88708491333, 9.11062272511], [3.02394524632, 9.97536280468], [4.18844691984, 9.03859152], [4.08419020365, 8.96601370727], [3.94732224704, 8.88649966438]]);
	}
	linear_extrude(height = 1.3441598848) {
		polygon(paths = [[0, 1, 2, 3, 4, 5]], points = [[2.82858341062, 9.03230364969], [1.86880336952, 8.69863518296], [1.70699052993, 8.42567897556], [1.6514545449, 7.79691273049], [3.32250038149, 7.90747585993], [3.33419508839, 7.9870864713]]);
	}
	linear_extrude(height = 0.5336748785) {
		polygon(paths = [[0, 1, 2, 3, 4, 5]], points = [[2.82858341062, 9.03230364969], [1.86880336952, 8.69863518296], [1.85496958743, 8.88573562713], [2.82552954604, 10.9781721163], [3.02394524632, 9.97536280468], [2.88708491333, 9.11062272511]]);
	}
	linear_extrude(height = 0.7912635100) {
		polygon(paths = [[0, 1, 2, 3, 4, 5]], points = [[4.79784406617, 1.7861102443], [5.44964787587, 1.27032447296], [5.73050328221, 2.07918018929], [5.56113553613, 2.53926828933], [5.08440215877, 2.78893301404], [4.78893477748, 1.82918997961]]);
	}
	linear_extrude(height = 1.0906194151) {
		polygon(paths = [[0, 1, 2, 3, 4, 5, 6]], points = [[5.08440215877, 2.78893301404], [4.97075097424, 3.12796967344], [5.81148807237, 3.58000651584], [6.61418229333, 3.50538172286], [6.8456916123, 2.55180092125], [6.53826871124, 2.39559092464], [5.56113553613, 2.53926828933]]);
	}
	linear_extrude(height = 1.1834572459) {
		polygon(paths = [[0, 1, 2, 3, 4, 5]], points = [[4.78893477748, 1.82918997961], [3.31834211258, 1.94840404205], [3.3563735058, 3.16428860819], [4.70351558892, 3.30980985899], [4.97075097424, 3.12796967344], [5.08440215877, 2.78893301404]]);
	}
	linear_extrude(height = 1.2812590651) {
		polygon(paths = [[0, 1, 2, 3, 4, 5, 6]], points = [[4.79784406617, 1.7861102443], [4.22081317647, 0.747364888152], [3.33632034062, 1.03167003792], [3.22506684795, 1.30410328144], [3.24640428036, 1.8095531033], [3.31834211258, 1.94840404205], [4.78893477748, 1.82918997961]]);
	}
	linear_extrude(height = 0.6196323493) {
		polygon(paths = [[0, 1, 2, 3, 4, 5]], points = [[6.11507099857, 1.46863592154], [5.55590456063, 1.16469551441], [5.53273731265, 0.808202806587], [6.65650868221, 0.646236532944], [6.69682481559, 1.1741735253], [6.27482726336, 1.48779180414]]);
	}
	linear_extrude(height = 0.6401084902) {
		polygon(paths = [[0, 1, 2, 3, 4, 5, 6]], points = [[5.55590456063, 1.16469551441], [5.44964787587, 1.27032447296], [4.79784406617, 1.7861102443], [4.22081317647, 0.747364888152], [4.42271562353, 0.426482235577], [5.44153450017, 0.609628231809], [5.53273731265, 0.808202806587]]);
	}
	linear_extrude(height = 1.0560446365) {
		polygon(paths = [[0, 1, 2, 3]], points = [[6.65650868221, 0.646236532944], [9.23325412052, -7.38462773721], [5.44153450017, 0.609628231809], [5.53273731265, 0.808202806587]]);
	}
	linear_extrude(height = 1.0954233238) {
		polygon(paths = [[0, 1, 2, 3]], points = [[6.11507099857, 1.46863592154], [5.73050328221, 2.07918018929], [5.44964787587, 1.27032447296], [5.55590456063, 1.16469551441]]);
	}
	linear_extrude(height = 0.6285636490) {
		polygon(paths = [[0, 1, 2, 3, 4, 5]], points = [[6.27482726336, 1.48779180414], [6.53826871124, 2.39559092464], [6.8456916123, 2.55180092125], [7.13865111749, 2.44590031984], [7.45392965694, 1.55385088361], [6.69682481559, 1.1741735253]]);
	}
	linear_extrude(height = 0.8186627330) {
		polygon(paths = [[0, 1, 2, 3, 4]], points = [[6.11507099857, 1.46863592154], [5.73050328221, 2.07918018929], [5.56113553613, 2.53926828933], [6.53826871124, 2.39559092464], [6.27482726336, 1.48779180414]]);
	}
}
